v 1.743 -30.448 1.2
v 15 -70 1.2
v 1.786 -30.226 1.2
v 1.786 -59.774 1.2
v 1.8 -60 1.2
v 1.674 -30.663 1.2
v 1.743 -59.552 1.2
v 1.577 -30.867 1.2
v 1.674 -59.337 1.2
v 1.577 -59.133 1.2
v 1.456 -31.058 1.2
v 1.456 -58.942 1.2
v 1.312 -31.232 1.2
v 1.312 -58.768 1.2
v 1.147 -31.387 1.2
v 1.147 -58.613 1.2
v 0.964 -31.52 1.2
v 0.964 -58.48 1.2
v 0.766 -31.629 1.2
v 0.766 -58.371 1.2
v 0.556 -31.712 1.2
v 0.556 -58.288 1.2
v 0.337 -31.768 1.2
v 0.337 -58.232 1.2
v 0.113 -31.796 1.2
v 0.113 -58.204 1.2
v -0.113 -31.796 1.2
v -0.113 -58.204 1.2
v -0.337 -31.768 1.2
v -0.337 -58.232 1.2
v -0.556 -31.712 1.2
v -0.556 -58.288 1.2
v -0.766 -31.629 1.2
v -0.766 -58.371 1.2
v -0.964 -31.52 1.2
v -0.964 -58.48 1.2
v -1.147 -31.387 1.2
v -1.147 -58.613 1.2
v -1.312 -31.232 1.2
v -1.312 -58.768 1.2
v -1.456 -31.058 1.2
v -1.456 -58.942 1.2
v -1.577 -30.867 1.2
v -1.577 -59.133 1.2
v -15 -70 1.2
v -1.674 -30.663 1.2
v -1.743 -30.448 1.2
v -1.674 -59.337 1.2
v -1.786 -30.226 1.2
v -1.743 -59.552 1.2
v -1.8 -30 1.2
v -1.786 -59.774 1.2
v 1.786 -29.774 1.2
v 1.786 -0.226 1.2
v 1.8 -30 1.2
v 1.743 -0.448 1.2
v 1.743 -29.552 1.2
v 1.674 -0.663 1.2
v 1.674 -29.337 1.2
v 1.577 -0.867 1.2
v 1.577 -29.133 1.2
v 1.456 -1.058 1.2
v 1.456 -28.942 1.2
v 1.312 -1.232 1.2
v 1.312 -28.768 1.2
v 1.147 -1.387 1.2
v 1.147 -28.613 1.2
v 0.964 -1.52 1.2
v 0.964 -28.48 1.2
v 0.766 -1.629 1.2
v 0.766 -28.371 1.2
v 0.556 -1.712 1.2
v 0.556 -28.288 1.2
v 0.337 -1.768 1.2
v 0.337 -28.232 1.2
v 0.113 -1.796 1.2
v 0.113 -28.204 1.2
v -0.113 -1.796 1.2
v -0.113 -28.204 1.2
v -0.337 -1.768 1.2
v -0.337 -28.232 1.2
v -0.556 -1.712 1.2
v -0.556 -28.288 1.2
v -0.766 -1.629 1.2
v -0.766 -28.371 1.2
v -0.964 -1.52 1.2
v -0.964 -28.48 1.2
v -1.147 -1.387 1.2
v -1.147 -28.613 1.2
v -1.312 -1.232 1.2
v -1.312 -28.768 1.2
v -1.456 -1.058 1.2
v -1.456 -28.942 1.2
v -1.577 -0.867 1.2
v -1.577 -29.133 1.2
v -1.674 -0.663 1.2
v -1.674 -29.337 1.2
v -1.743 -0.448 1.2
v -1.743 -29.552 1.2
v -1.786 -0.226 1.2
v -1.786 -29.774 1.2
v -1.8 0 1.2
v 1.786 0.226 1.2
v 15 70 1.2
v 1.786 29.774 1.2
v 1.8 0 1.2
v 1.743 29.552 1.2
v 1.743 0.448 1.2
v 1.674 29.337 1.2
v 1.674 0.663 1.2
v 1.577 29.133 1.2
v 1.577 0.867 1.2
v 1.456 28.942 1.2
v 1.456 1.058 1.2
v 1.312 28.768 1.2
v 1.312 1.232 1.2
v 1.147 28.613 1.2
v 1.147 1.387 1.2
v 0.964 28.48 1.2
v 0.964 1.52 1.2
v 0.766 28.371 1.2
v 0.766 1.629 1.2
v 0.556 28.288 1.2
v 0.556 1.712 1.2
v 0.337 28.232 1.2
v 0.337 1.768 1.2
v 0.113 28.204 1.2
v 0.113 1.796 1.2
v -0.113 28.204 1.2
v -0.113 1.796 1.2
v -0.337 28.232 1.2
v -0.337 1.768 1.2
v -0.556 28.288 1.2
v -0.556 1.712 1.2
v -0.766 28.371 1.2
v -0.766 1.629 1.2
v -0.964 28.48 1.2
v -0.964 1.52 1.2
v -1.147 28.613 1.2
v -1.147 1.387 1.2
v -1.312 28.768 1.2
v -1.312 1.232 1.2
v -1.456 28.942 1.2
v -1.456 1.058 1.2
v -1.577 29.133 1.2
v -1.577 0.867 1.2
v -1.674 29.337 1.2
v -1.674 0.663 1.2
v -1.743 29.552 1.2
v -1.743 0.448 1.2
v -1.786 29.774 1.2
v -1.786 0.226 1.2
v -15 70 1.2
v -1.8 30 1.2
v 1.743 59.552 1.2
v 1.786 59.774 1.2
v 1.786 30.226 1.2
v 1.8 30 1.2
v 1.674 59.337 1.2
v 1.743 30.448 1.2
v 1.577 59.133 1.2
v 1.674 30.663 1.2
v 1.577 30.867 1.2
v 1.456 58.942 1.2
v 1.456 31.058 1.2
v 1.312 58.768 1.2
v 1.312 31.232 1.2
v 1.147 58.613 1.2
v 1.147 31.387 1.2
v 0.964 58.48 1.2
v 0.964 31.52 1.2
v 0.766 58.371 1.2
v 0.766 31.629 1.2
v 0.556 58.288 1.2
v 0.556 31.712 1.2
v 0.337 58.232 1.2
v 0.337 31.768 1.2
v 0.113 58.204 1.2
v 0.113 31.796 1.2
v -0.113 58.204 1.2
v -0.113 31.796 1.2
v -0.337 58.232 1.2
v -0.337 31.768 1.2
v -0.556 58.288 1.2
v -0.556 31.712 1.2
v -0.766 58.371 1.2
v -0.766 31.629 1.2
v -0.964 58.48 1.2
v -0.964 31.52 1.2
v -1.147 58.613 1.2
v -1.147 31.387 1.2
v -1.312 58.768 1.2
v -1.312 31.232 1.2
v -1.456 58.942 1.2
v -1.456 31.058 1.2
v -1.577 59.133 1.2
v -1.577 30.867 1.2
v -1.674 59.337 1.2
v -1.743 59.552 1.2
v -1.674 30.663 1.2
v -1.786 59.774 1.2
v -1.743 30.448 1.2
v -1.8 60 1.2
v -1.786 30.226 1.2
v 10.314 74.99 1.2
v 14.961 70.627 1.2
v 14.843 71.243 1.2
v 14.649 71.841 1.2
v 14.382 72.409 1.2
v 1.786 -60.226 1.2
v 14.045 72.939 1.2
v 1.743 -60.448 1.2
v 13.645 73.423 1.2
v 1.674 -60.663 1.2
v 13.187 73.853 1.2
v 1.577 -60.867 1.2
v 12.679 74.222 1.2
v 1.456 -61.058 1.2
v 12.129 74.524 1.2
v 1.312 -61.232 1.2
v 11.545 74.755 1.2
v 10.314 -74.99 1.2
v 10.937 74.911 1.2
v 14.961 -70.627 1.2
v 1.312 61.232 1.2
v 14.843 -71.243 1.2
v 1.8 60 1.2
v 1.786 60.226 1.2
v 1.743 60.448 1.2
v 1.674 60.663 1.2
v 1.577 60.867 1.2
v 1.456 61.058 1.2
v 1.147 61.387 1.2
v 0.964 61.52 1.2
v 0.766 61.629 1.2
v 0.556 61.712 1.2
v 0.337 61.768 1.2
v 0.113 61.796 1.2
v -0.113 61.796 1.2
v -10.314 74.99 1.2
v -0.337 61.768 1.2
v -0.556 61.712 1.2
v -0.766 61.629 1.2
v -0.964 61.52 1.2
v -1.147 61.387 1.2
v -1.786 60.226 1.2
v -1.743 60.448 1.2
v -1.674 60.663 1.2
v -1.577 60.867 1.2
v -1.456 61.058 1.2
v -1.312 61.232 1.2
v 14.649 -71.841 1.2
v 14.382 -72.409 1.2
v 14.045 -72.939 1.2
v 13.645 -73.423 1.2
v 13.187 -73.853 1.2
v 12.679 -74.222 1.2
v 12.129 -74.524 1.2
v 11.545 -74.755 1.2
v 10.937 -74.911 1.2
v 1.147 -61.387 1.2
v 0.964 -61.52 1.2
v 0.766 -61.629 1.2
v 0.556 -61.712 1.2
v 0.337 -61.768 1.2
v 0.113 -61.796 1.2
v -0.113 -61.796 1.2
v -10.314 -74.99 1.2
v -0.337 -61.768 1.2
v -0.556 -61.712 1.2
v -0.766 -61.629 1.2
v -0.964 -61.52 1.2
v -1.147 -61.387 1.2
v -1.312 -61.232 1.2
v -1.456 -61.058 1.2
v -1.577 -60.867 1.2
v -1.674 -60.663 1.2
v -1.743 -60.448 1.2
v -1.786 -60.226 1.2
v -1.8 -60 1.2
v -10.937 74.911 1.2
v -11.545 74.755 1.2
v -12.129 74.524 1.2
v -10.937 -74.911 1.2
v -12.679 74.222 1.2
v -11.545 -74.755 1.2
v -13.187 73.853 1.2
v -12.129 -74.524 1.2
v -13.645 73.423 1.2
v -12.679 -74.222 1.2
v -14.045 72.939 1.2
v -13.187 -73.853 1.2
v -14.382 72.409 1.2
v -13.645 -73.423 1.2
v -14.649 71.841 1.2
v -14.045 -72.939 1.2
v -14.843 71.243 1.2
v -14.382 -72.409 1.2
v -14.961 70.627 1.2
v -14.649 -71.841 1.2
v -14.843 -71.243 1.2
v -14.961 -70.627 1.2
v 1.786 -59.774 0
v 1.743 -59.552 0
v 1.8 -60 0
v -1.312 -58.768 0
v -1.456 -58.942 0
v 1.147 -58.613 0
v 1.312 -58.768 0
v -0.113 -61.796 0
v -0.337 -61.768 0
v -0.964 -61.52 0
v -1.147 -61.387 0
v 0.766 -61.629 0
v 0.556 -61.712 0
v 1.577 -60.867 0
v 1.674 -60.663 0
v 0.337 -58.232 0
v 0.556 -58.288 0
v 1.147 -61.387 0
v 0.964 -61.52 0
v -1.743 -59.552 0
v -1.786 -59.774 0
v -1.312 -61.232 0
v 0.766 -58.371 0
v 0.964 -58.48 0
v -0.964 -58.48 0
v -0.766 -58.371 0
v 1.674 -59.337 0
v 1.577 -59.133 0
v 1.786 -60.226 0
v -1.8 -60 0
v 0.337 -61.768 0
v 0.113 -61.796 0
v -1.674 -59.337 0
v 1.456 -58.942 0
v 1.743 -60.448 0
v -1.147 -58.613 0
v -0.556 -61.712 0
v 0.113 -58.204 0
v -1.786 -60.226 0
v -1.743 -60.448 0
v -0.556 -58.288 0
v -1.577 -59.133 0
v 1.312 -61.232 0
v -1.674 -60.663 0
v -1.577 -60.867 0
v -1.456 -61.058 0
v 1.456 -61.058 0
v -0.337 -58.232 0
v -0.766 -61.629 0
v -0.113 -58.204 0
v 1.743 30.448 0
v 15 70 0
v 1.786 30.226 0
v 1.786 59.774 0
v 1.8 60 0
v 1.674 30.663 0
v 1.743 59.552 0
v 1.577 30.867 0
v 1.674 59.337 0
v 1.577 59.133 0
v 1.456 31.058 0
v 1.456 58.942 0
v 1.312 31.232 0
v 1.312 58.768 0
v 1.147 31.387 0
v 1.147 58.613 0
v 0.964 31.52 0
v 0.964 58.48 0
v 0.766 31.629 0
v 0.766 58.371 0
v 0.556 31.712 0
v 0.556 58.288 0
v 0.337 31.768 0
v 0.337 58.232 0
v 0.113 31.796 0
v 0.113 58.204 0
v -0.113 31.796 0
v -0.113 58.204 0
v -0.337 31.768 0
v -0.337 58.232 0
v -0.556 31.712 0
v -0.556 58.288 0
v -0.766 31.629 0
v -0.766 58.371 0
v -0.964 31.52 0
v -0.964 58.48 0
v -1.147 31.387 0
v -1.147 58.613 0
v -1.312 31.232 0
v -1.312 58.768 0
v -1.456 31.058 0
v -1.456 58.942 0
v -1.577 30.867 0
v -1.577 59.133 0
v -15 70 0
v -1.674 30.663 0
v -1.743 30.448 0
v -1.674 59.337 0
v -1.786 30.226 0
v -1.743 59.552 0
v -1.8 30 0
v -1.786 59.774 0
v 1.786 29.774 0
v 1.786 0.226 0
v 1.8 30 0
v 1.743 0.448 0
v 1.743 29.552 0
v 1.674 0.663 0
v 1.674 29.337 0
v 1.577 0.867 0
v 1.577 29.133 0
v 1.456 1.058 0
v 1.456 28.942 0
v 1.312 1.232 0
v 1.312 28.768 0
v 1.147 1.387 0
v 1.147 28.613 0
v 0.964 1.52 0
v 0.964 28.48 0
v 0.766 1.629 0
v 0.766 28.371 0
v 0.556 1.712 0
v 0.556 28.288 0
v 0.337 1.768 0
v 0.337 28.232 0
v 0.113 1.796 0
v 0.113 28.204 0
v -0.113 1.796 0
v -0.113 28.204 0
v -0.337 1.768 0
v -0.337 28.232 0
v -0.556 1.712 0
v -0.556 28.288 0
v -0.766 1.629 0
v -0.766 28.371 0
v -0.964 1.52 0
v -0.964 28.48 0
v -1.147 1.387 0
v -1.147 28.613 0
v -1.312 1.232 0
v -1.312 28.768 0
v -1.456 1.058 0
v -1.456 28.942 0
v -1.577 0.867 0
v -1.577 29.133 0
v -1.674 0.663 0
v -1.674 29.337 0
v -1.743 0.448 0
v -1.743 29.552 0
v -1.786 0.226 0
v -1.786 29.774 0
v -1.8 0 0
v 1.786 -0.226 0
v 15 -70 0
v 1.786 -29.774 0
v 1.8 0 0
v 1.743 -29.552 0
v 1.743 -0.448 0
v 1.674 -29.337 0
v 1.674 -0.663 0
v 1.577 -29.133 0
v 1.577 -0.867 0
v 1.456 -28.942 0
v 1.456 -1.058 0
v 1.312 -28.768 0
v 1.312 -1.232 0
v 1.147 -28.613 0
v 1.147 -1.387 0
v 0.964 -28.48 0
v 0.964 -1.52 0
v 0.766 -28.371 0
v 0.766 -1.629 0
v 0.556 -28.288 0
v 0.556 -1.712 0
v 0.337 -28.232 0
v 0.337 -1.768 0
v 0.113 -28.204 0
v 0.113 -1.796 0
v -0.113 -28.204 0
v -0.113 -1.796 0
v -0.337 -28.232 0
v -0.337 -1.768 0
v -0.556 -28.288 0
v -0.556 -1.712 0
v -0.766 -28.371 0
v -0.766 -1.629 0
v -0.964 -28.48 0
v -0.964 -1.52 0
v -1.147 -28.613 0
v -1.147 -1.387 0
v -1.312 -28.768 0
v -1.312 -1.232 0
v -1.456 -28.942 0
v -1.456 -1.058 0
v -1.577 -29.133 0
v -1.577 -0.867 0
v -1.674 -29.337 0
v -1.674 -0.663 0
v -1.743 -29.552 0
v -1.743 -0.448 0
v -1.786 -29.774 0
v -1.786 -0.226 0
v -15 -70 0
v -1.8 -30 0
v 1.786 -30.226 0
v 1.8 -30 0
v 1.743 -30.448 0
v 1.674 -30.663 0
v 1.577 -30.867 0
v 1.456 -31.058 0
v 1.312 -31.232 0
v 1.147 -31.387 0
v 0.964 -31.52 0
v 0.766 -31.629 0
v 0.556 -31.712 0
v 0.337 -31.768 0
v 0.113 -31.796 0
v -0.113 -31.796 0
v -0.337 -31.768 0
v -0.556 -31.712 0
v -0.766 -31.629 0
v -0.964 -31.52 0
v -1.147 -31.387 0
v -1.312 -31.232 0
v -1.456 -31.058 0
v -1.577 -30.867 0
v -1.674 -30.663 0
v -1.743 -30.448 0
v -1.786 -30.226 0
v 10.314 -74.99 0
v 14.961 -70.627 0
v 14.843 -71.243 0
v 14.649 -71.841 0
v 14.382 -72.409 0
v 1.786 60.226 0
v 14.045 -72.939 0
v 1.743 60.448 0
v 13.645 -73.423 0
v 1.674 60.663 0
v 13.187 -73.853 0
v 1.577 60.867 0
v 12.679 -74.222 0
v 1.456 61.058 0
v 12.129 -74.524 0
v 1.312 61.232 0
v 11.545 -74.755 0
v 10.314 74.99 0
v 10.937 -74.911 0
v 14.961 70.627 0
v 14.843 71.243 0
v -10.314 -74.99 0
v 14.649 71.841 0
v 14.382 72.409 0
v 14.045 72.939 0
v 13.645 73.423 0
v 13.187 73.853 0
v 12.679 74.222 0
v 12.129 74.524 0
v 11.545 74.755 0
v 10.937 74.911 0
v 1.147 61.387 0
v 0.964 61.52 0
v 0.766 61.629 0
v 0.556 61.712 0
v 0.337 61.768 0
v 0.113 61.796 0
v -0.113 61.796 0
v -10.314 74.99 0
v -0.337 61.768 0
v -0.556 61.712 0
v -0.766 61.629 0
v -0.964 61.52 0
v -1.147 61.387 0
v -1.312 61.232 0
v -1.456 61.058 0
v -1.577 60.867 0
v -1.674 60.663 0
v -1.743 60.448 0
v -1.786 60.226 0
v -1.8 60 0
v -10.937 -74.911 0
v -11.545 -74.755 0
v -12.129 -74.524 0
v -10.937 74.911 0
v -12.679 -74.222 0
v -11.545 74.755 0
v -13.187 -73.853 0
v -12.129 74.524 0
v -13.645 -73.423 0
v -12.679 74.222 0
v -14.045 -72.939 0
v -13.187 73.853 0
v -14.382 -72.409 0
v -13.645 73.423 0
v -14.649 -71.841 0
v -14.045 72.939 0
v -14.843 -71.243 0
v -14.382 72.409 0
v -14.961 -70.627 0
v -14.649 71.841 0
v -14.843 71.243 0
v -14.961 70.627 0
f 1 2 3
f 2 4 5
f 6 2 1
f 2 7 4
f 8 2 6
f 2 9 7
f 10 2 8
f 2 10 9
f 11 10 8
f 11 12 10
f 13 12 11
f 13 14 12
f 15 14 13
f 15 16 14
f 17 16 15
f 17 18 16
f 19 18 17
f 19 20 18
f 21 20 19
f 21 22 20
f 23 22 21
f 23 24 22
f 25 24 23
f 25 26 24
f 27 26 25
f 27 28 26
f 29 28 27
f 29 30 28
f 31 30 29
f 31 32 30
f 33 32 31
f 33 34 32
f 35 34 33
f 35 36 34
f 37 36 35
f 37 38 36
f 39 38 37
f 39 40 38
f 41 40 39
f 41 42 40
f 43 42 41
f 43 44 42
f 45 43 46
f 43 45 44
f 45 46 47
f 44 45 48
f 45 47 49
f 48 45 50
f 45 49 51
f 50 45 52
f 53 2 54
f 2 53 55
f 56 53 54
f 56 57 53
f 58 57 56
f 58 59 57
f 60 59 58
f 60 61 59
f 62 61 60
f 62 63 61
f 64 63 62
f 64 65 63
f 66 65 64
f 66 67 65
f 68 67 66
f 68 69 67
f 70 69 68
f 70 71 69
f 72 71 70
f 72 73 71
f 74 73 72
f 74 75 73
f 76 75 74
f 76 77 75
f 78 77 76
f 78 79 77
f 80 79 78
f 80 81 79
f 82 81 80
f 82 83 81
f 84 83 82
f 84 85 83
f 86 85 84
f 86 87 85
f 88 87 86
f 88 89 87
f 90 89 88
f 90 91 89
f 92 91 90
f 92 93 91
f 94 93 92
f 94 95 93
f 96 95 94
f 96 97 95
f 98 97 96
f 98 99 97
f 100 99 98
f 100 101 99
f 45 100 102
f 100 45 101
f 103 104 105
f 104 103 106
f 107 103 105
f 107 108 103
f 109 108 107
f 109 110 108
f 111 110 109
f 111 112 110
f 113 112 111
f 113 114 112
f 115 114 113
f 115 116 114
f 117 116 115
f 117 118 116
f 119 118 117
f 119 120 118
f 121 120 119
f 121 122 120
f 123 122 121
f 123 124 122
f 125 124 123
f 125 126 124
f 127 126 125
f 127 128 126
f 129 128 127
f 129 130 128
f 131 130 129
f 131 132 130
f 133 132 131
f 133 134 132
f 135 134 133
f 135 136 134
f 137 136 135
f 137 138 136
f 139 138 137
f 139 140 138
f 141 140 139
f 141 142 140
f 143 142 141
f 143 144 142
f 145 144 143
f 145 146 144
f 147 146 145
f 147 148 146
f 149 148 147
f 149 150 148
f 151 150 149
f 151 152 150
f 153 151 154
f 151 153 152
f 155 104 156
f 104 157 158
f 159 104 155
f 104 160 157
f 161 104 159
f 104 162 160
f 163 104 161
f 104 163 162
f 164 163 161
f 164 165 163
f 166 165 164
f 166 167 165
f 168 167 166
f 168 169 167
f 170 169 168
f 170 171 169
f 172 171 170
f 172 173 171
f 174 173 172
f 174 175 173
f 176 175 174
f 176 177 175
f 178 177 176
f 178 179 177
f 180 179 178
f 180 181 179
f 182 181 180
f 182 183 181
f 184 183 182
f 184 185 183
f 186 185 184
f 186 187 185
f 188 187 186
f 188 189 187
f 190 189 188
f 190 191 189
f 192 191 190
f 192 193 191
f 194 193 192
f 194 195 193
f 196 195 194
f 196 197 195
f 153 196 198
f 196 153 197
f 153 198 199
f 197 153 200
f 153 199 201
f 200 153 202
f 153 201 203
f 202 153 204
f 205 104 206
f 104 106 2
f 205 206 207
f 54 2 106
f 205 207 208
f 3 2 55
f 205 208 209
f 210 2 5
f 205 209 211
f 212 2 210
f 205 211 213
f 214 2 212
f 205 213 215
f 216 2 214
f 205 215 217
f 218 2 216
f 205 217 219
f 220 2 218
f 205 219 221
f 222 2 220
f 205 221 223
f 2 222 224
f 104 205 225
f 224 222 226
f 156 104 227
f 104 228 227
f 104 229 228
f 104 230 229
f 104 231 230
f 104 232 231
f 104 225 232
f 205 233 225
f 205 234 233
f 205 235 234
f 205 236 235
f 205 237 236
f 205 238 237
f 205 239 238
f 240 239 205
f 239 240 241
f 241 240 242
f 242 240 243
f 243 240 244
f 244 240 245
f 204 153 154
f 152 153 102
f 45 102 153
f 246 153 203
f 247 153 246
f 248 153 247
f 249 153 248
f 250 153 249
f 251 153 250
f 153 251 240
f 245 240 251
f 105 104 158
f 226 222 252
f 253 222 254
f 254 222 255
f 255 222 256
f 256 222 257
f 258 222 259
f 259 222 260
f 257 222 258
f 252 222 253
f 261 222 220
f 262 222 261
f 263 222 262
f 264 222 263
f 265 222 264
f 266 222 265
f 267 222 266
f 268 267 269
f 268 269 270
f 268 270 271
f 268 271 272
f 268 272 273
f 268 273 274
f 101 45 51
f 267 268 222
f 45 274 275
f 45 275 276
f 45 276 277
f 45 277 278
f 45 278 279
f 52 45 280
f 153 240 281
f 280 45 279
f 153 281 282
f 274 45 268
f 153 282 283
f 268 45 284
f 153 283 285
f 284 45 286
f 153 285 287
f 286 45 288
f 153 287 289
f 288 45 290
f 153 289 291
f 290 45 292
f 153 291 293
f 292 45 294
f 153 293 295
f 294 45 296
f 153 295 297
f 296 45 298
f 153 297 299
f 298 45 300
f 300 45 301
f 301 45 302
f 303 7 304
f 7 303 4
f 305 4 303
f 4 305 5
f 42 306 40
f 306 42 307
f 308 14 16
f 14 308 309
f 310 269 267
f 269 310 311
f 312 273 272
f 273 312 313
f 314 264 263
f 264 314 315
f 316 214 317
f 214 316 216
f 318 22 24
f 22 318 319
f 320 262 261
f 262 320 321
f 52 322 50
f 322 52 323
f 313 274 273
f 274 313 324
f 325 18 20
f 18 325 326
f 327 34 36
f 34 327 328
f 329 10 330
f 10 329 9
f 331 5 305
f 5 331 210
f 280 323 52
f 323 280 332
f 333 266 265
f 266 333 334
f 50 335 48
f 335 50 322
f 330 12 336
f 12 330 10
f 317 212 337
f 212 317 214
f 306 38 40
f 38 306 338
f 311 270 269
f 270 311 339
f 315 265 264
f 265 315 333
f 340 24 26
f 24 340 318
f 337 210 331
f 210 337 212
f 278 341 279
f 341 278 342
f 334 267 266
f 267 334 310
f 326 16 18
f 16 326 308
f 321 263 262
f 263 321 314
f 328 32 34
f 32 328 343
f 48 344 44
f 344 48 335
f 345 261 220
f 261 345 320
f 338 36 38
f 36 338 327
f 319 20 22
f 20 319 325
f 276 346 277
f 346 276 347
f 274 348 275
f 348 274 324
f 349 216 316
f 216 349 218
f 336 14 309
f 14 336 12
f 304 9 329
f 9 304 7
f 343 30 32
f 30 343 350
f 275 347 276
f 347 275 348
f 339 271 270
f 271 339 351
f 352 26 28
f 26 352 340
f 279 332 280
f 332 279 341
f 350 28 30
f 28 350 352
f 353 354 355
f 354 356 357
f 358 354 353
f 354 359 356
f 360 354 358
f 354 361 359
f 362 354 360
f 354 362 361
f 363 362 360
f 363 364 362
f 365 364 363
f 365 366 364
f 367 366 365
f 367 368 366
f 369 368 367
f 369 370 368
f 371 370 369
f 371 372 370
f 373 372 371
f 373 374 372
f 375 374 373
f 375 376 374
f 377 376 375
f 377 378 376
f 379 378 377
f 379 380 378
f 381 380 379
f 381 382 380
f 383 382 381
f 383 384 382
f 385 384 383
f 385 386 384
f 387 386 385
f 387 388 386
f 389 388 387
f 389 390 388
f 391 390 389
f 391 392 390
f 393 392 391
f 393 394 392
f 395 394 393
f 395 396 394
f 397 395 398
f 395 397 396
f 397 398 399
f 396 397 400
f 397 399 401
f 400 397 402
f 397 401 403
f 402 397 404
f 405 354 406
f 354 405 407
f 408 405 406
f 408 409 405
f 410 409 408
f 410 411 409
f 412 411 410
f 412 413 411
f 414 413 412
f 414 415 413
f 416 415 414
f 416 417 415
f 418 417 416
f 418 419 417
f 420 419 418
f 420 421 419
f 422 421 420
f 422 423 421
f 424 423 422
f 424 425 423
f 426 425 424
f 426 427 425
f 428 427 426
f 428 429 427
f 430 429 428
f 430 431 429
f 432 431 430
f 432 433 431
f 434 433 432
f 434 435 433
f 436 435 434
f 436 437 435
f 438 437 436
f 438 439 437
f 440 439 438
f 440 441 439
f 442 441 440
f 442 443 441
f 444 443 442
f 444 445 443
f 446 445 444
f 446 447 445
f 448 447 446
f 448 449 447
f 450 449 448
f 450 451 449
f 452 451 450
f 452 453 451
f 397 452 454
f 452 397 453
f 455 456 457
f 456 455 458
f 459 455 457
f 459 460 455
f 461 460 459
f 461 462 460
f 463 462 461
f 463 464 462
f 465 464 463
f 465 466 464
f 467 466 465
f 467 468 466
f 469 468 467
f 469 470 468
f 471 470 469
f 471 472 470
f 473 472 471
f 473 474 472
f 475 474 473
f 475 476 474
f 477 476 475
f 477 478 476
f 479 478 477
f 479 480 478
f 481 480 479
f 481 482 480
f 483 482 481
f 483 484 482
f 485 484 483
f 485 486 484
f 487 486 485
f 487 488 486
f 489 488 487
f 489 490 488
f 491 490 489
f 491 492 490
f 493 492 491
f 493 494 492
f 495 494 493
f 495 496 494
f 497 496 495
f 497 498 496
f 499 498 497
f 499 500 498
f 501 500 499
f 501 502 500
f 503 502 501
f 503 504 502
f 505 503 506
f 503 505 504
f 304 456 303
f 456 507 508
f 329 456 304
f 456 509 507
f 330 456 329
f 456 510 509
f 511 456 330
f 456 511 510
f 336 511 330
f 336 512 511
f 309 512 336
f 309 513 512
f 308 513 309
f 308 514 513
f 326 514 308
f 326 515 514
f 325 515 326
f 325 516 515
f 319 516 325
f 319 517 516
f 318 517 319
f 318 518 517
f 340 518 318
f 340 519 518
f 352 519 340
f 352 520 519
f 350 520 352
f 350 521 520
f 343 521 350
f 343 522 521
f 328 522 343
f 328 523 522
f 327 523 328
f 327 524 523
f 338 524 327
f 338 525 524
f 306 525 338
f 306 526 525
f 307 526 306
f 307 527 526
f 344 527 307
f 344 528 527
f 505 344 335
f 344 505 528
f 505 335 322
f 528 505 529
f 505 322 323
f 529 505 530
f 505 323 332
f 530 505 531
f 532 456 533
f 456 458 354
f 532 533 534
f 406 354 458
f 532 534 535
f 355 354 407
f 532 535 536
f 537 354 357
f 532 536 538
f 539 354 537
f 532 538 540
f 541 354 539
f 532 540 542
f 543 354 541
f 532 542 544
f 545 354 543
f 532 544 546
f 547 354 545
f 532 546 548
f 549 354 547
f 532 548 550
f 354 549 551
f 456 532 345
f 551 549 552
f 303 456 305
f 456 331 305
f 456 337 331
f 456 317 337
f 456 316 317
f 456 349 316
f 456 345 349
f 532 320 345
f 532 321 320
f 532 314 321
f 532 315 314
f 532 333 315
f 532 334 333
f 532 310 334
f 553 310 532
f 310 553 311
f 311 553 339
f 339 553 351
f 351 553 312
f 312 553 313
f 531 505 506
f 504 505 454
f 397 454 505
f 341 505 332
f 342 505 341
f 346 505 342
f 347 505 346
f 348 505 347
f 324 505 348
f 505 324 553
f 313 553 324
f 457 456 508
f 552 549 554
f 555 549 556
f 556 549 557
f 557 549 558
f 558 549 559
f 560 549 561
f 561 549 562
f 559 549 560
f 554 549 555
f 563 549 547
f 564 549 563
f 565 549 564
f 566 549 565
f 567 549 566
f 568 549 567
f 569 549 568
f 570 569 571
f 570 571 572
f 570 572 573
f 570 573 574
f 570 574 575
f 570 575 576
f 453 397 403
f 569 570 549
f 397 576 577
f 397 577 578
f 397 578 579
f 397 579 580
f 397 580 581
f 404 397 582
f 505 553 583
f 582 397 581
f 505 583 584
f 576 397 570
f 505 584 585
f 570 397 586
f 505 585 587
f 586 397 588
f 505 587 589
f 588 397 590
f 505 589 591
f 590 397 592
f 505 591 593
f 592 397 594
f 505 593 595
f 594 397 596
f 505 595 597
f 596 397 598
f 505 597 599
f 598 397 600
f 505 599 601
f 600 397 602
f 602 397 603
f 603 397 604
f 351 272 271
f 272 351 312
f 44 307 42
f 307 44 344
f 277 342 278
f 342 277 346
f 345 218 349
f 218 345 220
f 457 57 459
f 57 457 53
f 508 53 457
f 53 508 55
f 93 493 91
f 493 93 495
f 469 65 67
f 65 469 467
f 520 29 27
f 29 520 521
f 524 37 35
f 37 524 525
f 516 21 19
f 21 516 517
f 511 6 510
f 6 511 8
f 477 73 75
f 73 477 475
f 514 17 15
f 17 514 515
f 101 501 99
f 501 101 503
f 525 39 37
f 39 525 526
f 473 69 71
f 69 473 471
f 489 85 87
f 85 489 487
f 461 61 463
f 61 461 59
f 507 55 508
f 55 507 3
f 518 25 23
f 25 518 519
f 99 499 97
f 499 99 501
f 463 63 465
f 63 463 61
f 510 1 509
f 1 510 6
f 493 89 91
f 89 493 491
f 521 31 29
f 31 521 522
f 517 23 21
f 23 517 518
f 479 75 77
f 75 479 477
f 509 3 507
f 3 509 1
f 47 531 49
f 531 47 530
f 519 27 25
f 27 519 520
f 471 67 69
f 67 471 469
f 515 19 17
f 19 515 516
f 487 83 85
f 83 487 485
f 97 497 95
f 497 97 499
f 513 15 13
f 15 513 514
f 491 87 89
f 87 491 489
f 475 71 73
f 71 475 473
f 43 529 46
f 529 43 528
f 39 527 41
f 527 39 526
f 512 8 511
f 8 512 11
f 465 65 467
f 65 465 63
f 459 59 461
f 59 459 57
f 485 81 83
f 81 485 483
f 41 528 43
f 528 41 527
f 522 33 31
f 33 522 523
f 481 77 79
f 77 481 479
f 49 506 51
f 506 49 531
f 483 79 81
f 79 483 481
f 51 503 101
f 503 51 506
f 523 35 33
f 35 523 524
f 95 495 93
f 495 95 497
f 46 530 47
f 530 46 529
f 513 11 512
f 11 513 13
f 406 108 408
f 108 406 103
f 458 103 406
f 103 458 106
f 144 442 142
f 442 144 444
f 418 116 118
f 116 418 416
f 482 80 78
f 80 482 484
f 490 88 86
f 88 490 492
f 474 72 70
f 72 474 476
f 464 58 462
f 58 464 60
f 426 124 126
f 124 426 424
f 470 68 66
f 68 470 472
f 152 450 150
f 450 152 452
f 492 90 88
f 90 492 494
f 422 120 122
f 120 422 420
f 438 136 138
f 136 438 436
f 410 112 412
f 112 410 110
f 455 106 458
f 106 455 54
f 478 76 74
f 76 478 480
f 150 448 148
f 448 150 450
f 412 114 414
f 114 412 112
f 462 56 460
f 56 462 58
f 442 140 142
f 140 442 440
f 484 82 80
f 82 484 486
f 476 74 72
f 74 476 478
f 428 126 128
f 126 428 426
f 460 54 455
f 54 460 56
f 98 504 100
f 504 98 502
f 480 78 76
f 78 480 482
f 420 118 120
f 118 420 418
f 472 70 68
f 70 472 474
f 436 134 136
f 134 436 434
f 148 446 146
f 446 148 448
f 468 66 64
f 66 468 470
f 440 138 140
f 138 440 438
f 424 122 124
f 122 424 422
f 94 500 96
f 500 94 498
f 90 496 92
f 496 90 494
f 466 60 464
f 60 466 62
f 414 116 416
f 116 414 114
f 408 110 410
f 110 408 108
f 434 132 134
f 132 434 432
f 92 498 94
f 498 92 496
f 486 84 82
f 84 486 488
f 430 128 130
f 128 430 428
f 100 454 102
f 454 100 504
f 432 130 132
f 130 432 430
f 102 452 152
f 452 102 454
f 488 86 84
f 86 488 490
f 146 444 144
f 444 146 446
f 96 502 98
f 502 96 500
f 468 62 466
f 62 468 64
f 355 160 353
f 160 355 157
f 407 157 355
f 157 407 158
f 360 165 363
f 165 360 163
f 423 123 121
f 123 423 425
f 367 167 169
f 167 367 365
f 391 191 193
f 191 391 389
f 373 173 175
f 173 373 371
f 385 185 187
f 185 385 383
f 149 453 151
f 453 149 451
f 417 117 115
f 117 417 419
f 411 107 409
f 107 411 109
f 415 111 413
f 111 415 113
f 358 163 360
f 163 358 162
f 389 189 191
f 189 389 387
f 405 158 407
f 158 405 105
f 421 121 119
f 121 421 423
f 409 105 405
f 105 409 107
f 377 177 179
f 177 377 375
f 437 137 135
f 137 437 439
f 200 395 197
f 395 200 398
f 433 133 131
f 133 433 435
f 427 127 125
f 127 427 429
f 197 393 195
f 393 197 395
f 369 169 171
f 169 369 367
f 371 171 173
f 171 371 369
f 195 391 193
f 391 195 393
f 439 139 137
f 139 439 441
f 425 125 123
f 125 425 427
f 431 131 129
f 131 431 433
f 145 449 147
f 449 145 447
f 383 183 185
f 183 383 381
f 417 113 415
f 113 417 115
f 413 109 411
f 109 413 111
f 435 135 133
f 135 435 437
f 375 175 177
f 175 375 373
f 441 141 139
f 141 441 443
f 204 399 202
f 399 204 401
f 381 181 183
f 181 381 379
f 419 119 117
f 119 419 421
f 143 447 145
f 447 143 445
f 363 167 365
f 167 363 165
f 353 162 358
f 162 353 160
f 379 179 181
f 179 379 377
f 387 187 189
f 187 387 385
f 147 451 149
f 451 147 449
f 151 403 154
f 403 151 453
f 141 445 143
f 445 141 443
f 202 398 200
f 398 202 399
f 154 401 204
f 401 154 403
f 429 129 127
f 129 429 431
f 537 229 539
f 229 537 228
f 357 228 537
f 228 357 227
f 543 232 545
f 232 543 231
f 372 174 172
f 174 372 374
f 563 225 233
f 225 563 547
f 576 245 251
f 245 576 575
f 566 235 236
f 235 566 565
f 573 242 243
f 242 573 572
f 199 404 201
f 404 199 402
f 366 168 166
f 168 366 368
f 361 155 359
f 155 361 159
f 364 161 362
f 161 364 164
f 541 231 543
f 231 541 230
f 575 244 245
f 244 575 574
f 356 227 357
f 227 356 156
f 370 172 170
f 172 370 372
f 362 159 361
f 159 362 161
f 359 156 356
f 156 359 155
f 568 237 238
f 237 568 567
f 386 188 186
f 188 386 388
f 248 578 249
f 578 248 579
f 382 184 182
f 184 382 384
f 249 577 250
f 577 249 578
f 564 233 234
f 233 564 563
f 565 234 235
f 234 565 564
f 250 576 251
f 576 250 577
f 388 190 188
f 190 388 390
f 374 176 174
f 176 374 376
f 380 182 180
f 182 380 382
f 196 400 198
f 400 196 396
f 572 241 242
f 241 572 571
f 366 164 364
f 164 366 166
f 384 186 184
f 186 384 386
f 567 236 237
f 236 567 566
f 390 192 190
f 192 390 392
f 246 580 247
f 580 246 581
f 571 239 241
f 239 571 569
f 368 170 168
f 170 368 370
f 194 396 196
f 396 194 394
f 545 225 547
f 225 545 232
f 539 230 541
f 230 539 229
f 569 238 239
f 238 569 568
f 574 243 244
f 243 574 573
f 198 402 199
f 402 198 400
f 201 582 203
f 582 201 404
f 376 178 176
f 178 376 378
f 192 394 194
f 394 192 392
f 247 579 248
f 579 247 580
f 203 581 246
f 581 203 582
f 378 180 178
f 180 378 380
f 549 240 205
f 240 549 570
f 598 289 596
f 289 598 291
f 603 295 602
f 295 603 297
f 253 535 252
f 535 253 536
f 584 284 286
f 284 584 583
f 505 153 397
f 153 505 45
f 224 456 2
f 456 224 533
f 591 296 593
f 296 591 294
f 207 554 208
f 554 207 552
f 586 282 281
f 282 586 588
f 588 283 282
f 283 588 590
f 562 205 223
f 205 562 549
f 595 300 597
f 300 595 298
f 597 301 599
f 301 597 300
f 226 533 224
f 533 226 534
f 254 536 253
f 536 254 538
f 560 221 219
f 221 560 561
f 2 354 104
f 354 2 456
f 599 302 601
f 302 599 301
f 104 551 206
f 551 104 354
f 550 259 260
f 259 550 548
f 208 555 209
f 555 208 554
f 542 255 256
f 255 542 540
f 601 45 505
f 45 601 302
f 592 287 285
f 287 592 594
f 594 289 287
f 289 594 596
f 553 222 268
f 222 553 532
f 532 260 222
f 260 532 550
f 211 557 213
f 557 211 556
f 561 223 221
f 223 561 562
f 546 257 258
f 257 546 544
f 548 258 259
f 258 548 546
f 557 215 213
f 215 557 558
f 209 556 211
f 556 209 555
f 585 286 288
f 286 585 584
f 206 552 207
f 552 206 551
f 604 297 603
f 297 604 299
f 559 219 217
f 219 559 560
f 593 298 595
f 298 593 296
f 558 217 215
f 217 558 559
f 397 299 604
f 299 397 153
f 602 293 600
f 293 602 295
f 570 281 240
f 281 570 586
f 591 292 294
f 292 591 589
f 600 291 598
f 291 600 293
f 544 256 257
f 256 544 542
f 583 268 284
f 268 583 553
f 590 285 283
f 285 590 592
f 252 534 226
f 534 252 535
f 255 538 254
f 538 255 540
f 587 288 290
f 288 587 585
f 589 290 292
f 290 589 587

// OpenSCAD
$fn = 50;


difference() {
	union() {
		hull() {
			translate(v = [-10.0000000000, 70.0000000000, 0]) {
				cylinder(h = 12, r = 5);
			}
			translate(v = [10.0000000000, 70.0000000000, 0]) {
				cylinder(h = 12, r = 5);
			}
			translate(v = [-10.0000000000, -70.0000000000, 0]) {
				cylinder(h = 12, r = 5);
			}
			translate(v = [10.0000000000, -70.0000000000, 0]) {
				cylinder(h = 12, r = 5);
			}
		}
	}
	union() {
		translate(v = [0, 0, 1.2000000000]) {
			hull() {
				translate(v = [-10.0000000000, 70.0000000000, 0]) {
					cylinder(h = 10.8000000000, r = 3.8000000000);
				}
				translate(v = [10.0000000000, 70.0000000000, 0]) {
					cylinder(h = 10.8000000000, r = 3.8000000000);
				}
				translate(v = [-10.0000000000, -70.0000000000, 0]) {
					cylinder(h = 10.8000000000, r = 3.8000000000);
				}
				translate(v = [10.0000000000, -70.0000000000, 0]) {
					cylinder(h = 10.8000000000, r = 3.8000000000);
				}
			}
		}
		#translate(v = [0.0000000000, -60.0000000000, 0]) {
			cylinder(h = 1.2000000000, r = 1.8000000000);
		}
		#translate(v = [0.0000000000, -30.0000000000, 0]) {
			cylinder(h = 1.2000000000, r = 1.8000000000);
		}
		#cylinder(h = 1.2000000000, r = 1.8000000000);
		#translate(v = [0.0000000000, 30.0000000000, 0]) {
			cylinder(h = 1.2000000000, r = 1.8000000000);
		}
		#translate(v = [0.0000000000, 60.0000000000, 0]) {
			cylinder(h = 1.2000000000, r = 1.8000000000);
		}
		translate(v = [-250.0000000000, -250.0000000000, 1.2000000000]) {
			cube(size = [500, 500, 500]);
		}
		translate(v = [-250.0000000000, -250.0000000000, 1.2000000000]) {
			cube(size = [500, 500, 500]);
		}
		translate(v = [-250.0000000000, -250.0000000000, 1.2000000000]) {
			cube(size = [500, 500, 500]);
		}
	}
}
